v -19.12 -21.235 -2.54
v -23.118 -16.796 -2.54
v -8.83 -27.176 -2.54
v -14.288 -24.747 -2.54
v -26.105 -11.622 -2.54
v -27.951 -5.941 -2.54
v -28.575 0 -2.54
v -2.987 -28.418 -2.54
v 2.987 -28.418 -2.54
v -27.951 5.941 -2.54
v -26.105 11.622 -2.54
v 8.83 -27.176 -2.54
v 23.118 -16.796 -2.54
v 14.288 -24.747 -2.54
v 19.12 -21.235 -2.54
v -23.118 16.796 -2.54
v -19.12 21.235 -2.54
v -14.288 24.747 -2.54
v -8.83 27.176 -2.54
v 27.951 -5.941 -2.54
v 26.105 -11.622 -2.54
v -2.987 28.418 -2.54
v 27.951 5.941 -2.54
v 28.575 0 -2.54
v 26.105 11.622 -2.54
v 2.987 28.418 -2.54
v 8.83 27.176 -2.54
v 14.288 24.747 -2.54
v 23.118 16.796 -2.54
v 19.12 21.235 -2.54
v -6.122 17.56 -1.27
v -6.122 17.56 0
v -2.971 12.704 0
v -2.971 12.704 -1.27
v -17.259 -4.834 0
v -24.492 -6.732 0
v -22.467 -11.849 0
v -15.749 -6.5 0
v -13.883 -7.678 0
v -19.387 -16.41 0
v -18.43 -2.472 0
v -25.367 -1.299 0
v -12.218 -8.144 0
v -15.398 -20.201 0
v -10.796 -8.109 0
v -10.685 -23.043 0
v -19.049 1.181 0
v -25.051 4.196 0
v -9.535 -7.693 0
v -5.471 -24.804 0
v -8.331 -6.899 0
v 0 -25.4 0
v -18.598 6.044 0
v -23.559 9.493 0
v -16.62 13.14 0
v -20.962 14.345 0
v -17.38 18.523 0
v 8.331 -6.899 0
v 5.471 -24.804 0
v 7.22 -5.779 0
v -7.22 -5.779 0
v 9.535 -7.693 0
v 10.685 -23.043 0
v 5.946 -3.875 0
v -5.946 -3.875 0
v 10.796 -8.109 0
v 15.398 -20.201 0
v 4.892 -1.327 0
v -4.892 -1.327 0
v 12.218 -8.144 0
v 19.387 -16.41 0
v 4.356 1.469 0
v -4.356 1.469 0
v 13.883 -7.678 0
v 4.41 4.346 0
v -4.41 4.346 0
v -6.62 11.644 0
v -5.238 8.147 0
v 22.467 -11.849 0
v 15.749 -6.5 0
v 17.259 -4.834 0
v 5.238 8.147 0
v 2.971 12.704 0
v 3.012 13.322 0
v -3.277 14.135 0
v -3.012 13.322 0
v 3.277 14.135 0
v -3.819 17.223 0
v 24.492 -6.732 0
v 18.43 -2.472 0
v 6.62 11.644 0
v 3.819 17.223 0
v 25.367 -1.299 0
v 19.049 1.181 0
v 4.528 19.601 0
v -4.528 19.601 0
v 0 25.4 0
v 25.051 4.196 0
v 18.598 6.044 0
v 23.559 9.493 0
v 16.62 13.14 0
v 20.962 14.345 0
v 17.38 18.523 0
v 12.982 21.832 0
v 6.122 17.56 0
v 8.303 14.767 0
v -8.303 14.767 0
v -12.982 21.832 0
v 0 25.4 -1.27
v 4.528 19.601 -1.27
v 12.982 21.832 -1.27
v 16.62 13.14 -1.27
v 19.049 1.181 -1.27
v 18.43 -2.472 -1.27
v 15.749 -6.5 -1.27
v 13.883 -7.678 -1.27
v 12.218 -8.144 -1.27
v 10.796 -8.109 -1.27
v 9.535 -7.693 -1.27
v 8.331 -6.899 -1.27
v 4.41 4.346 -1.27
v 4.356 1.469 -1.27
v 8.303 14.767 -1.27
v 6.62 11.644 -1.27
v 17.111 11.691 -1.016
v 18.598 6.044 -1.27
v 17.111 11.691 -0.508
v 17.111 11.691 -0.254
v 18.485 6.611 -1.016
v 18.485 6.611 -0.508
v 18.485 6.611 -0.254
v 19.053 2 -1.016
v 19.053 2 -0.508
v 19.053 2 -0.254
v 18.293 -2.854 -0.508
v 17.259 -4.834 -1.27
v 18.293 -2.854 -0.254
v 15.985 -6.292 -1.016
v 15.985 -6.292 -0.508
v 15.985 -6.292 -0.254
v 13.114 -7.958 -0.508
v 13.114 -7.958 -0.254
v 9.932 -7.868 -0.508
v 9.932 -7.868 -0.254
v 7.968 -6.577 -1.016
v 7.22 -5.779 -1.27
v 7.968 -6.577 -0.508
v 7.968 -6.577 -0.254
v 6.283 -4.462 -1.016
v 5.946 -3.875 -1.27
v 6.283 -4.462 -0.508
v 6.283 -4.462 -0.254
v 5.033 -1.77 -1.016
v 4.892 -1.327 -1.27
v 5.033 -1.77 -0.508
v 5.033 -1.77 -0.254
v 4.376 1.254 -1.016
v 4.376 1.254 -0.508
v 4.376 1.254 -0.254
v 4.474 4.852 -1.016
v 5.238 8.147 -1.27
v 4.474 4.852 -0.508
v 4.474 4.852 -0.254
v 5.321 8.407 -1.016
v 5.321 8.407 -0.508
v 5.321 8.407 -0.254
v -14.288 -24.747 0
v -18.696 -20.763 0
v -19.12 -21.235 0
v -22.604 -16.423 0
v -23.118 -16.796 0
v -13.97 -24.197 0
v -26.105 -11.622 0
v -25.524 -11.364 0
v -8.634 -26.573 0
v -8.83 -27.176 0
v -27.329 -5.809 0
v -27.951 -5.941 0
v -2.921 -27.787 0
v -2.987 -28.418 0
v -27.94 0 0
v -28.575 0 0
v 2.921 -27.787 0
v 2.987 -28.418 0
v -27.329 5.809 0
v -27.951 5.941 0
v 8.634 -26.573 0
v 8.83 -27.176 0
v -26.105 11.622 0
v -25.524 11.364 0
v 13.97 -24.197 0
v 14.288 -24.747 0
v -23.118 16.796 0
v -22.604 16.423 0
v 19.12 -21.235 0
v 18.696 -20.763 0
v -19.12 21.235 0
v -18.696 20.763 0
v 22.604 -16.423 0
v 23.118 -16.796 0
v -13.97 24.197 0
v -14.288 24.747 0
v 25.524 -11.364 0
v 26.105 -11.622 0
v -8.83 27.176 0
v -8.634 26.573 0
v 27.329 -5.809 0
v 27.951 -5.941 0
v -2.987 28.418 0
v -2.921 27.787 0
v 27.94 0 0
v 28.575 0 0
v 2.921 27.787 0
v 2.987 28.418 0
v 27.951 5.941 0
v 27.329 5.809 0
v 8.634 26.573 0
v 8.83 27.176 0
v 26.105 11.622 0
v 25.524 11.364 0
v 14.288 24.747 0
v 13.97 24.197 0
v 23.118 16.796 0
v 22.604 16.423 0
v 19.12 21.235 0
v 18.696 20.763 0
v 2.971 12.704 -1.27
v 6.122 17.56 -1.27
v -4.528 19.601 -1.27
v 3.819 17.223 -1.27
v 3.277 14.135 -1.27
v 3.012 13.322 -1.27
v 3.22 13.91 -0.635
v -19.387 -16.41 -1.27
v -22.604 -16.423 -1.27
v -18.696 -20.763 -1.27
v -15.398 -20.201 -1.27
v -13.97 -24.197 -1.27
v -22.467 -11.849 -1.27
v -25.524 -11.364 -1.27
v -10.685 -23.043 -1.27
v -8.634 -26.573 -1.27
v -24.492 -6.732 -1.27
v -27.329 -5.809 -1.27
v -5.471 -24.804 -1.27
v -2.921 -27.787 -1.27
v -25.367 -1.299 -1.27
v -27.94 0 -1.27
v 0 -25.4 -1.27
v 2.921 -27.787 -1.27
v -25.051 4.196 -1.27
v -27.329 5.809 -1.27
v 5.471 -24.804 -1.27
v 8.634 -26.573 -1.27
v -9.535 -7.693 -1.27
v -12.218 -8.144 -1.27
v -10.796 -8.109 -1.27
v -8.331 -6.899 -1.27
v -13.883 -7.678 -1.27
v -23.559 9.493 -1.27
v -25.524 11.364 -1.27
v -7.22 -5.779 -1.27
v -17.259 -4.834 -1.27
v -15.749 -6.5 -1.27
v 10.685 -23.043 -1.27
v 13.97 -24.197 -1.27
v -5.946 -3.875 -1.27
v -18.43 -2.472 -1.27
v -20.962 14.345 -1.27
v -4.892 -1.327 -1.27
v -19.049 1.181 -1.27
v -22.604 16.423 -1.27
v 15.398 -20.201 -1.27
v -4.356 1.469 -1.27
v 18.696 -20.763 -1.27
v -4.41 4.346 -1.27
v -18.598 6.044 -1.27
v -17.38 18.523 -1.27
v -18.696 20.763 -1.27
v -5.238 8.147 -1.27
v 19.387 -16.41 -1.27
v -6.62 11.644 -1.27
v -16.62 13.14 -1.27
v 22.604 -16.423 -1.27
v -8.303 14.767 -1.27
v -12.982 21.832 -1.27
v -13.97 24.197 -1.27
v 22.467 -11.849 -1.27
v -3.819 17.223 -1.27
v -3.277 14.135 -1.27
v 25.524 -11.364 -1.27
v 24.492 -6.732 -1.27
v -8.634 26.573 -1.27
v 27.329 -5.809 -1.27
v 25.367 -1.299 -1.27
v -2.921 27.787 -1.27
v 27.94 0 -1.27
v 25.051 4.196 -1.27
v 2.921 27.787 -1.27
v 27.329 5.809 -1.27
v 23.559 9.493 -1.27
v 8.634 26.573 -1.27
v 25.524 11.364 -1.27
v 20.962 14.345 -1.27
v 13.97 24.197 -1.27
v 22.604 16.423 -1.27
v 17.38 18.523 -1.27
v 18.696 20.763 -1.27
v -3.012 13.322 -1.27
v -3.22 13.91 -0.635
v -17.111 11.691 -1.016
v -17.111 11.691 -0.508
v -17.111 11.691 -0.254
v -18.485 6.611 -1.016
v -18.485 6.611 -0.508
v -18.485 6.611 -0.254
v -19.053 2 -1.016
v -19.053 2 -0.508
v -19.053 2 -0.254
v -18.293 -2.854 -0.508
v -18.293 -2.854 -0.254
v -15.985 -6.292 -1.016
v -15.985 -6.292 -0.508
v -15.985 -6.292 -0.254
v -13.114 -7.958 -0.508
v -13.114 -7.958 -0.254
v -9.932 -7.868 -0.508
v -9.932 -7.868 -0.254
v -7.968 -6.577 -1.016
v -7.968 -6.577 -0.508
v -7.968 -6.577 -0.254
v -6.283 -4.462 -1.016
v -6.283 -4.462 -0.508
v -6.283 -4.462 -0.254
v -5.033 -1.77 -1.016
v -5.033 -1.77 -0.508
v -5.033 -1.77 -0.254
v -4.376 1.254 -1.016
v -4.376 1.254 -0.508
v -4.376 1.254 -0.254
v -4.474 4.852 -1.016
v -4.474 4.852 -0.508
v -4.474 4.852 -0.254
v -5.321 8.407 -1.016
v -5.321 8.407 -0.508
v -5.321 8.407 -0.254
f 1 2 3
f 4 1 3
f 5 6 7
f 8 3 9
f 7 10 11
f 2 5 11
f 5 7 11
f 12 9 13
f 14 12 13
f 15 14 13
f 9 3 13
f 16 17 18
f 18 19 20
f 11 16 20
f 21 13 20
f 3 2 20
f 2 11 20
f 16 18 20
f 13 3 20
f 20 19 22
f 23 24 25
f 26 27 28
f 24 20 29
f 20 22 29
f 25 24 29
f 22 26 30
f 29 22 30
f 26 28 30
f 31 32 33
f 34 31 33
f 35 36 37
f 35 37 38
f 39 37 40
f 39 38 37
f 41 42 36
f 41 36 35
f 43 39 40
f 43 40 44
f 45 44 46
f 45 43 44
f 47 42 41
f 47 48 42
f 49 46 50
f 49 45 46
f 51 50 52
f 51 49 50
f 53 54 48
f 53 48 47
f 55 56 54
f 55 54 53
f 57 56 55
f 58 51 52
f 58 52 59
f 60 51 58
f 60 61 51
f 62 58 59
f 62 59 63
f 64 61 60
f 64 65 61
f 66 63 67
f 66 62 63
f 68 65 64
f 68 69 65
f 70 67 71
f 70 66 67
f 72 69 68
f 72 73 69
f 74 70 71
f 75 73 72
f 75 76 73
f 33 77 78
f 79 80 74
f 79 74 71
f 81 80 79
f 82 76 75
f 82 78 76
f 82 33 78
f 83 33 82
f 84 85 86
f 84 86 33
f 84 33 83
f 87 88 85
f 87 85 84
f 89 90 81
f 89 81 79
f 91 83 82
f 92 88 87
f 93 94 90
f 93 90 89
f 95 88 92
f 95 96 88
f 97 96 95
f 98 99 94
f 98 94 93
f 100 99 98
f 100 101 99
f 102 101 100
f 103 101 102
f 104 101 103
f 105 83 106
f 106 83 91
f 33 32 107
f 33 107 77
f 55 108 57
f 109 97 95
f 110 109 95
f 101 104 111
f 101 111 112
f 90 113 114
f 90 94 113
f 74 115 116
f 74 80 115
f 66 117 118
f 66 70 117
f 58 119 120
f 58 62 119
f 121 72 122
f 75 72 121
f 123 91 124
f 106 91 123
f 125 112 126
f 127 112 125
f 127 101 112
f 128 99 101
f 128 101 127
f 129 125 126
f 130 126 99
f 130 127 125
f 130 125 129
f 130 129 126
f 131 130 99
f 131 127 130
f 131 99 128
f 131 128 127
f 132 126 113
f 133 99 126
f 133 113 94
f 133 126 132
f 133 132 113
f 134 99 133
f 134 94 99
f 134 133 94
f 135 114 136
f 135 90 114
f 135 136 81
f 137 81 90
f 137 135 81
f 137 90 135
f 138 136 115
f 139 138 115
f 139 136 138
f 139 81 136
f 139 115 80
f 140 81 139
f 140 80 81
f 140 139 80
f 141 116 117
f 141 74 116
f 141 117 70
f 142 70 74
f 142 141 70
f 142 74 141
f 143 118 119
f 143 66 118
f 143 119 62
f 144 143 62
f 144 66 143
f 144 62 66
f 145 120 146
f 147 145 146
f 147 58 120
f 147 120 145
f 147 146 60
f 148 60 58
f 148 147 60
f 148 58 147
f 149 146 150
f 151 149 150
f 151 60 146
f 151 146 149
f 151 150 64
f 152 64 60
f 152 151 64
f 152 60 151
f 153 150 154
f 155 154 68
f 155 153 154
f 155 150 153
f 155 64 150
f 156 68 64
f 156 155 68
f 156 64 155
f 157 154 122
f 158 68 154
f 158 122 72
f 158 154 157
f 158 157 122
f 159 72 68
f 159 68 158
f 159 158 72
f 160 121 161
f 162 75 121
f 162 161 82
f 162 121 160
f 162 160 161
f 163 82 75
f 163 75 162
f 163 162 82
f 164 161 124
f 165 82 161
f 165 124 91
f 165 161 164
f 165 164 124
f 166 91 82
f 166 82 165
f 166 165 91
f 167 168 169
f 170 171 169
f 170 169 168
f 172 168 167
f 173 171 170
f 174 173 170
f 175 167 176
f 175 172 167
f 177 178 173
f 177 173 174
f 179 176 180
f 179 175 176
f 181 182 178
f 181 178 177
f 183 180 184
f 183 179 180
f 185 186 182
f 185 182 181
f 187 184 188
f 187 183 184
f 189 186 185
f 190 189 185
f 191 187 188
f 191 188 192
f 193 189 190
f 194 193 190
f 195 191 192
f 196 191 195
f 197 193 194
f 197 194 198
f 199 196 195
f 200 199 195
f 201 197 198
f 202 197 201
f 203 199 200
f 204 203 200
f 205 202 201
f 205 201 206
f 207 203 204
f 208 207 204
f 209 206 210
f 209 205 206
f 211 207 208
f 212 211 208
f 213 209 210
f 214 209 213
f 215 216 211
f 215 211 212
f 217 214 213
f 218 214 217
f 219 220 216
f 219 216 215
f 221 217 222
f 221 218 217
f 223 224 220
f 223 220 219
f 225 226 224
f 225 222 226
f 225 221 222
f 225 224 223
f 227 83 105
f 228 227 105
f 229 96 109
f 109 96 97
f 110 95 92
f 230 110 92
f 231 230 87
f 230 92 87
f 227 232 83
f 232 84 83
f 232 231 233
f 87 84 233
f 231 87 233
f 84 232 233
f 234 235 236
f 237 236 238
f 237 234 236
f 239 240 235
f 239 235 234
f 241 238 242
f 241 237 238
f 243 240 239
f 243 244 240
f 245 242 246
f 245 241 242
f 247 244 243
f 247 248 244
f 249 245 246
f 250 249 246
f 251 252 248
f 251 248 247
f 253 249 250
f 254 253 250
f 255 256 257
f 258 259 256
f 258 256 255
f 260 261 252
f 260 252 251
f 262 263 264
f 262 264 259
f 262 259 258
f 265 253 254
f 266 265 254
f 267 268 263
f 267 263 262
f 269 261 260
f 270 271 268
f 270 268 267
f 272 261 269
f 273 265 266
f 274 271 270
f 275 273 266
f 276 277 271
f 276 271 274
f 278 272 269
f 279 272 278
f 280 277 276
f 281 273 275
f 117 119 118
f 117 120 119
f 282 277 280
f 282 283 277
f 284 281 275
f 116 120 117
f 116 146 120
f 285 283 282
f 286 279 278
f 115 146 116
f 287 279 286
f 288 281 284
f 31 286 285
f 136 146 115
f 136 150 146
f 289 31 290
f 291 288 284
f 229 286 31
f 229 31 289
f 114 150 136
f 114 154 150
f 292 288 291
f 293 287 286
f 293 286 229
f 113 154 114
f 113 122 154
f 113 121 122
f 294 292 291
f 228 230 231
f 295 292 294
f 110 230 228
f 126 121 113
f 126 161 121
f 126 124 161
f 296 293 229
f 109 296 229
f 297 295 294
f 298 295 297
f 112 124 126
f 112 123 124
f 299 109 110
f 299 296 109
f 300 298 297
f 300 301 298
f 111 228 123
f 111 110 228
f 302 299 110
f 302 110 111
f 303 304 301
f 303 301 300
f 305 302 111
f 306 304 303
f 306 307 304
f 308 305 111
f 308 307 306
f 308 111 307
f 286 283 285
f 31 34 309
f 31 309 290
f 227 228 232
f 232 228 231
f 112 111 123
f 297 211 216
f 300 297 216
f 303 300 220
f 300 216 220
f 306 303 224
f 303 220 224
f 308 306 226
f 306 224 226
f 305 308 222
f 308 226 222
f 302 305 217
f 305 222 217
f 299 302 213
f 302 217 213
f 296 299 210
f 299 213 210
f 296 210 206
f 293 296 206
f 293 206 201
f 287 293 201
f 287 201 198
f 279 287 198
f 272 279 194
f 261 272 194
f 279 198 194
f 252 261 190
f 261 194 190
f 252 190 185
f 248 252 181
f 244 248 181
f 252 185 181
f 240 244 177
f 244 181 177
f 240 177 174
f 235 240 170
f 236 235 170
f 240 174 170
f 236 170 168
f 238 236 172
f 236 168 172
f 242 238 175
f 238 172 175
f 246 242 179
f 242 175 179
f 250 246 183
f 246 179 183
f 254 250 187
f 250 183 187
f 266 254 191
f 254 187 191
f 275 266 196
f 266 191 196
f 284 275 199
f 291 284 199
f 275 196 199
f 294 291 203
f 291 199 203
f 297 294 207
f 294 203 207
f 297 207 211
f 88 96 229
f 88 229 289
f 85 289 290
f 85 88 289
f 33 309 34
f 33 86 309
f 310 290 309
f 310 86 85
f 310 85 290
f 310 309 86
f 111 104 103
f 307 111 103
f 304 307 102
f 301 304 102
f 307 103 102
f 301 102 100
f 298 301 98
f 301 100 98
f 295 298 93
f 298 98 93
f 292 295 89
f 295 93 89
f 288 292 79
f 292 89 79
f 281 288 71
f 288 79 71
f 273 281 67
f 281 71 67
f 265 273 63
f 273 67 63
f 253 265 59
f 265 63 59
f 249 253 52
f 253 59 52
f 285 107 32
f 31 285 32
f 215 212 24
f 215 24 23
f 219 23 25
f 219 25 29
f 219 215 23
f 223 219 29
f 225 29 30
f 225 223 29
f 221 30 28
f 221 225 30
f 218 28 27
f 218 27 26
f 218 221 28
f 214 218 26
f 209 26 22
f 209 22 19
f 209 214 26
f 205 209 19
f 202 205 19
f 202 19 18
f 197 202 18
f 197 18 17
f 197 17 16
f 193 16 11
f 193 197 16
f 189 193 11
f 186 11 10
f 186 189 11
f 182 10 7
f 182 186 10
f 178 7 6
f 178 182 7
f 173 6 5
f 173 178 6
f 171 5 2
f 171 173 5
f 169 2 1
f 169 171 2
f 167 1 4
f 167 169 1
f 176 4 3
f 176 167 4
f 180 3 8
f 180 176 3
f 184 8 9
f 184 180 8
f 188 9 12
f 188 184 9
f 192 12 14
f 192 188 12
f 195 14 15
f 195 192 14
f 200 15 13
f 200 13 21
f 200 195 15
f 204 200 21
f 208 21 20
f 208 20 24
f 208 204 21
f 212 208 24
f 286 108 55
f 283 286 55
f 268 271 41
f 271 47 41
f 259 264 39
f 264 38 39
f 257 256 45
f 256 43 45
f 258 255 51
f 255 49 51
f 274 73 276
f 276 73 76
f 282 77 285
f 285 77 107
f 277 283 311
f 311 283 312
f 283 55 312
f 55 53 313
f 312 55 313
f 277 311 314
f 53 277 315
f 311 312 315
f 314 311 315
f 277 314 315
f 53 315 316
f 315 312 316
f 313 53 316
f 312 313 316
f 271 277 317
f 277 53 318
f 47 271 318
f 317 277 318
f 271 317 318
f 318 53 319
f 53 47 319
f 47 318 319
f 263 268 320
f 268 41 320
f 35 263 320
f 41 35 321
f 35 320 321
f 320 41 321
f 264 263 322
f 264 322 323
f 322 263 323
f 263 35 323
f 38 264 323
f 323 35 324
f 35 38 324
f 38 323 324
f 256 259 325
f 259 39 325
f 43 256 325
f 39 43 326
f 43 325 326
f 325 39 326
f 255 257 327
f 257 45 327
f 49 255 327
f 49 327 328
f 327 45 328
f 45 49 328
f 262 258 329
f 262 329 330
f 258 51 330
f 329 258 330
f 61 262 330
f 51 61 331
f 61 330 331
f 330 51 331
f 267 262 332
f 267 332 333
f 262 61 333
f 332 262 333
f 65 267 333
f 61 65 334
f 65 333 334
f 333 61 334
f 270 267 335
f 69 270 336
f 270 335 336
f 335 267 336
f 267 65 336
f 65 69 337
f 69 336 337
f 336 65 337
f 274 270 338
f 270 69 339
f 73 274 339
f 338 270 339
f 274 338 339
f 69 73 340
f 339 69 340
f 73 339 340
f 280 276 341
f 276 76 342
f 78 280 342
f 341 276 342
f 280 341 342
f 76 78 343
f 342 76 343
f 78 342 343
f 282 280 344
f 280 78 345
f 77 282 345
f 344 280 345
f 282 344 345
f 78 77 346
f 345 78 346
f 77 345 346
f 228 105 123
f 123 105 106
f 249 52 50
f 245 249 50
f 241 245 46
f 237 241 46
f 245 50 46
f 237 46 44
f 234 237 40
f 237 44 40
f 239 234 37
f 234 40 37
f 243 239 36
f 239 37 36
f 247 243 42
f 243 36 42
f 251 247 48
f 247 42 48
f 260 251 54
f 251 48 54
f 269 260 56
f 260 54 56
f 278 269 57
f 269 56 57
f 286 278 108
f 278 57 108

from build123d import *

# Parameters (mm, degrees)
F1_R     = 28.575
F2_DEPTH = 2.54
F0_R     = 27.94
F3_DEPTH = 1.27


with BuildPart() as f2:
    # F1 (on Top) → F2 (new body)
    with BuildSketch(Plane.XY):
        Circle(F1_R)
    extrude(amount=-F2_DEPTH)

    # F0 (on Top) → F3 (cut)
    with BuildSketch(Plane.XY):
        Circle(F0_R)
        with BuildLine():
            ThreePointArc((-12.9824397575, 21.8315427293), (-6.7319690535, 24.491643323), (0, 25.4))
            ThreePointArc((0, 25.4), (6.7319690535, 24.491643323), (12.9824397575, 21.8315427293))
            ThreePointArc((12.9824397575, 21.8315427293), (24.491643323, -6.7319690535), (0, -25.4))
            ThreePointArc((0, -25.4), (-24.491643323, -6.7319690535), (-12.9824397575, 21.8315427293))
        make_face(mode=Mode.SUBTRACT)
        with BuildLine():
            Line((-4.5284444434, 19.6012370521), (0, 25.4))
            ThreePointArc((0, 25.4), (-6.7319690535, 24.491643323), (-12.9824397575, 21.8315427293))
            add(Edge.make_bspline(
                [(-12.9824397575, 21.8315427293), (-16.0030685137, 15.555784787), (-20.8706185969, 2.5324190308), (-17.0205320702, -6.8009951083), (-9.0413114467, -9.8024376533), (-2.0221816541, 1.6054390369), (-6.0604248598, 11.0668484831), (-8.3033278917, 14.767423908)],
                knots=[0, 0, 0, 0, 0.267130235, 0.4415507763, 0.5882558694, 0.7799558658, 1, 1, 1, 1], degree=3))
            Line((-8.3033278917, 14.767423908), (-6.1221701965, 17.5604396079))
            Line((-6.1221701965, 17.5604396079), (-4.5284444434, 19.6012370521))
        make_face()
        with BuildLine():
            ThreePointArc((12.9824397575, 21.8315427293), (6.7319690535, 24.491643323), (0, 25.4))
            Line((0, 25.4), (4.5284444434, 19.6012370521))
            Line((4.5284444434, 19.6012370521), (6.1221701965, 17.5604396079))
            Line((6.1221701965, 17.5604396079), (8.3033278917, 14.767423908))
            add(Edge.make_bspline(
                [(12.9824397575, 21.8315427293), (16.0030685137, 15.555784787), (20.8706185969, 2.5324190308), (17.0205320702, -6.8009951083), (9.0413114467, -9.8024376533), (2.0221816541, 1.6054390369), (6.0604248598, 11.0668484831), (8.3033278917, 14.767423908)],
                knots=[0, 0, 0, 0, 0.267130235, 0.4415507763, 0.5882558694, 0.7799558658, 1, 1, 1, 1], degree=3))
        make_face()
        with BuildLine():
            Line((6.1221701965, 17.5604396079), (4.5284444434, 19.6012370521))
            add(Edge.make_bspline(
                [(4.5284444434, 19.6012370521), (3.7872271779, 18.2003817365), (3.371286388, 13.3642519376), (2.9613813264, 13.5061021755), (2.9711382824, 12.7042779153)],
                knots=[0, 0, 0, 0, 0.6853701695, 1, 1, 1, 1], degree=3))
            Line((2.9711382824, 12.7042779153), (6.1221701965, 17.5604396079))
        make_face()
        with BuildLine():
            add(Edge.make_bspline(
                [(-4.5284444434, 19.6012370521), (-3.7872271779, 18.2003817365), (-3.371286388, 13.3642519376), (-2.9613813264, 13.5061021755), (-2.9711382824, 12.7042779153)],
                knots=[0, 0, 0, 0, 0.6853701695, 1, 1, 1, 1], degree=3))
            Line((-4.5284444434, 19.6012370521), (-6.1221701965, 17.5604396079))
            Line((-6.1221701965, 17.5604396079), (-2.9711382824, 12.7042779153))
        make_face()
    extrude(amount=-F3_DEPTH, mode=Mode.SUBTRACT)


solid = f2.part
